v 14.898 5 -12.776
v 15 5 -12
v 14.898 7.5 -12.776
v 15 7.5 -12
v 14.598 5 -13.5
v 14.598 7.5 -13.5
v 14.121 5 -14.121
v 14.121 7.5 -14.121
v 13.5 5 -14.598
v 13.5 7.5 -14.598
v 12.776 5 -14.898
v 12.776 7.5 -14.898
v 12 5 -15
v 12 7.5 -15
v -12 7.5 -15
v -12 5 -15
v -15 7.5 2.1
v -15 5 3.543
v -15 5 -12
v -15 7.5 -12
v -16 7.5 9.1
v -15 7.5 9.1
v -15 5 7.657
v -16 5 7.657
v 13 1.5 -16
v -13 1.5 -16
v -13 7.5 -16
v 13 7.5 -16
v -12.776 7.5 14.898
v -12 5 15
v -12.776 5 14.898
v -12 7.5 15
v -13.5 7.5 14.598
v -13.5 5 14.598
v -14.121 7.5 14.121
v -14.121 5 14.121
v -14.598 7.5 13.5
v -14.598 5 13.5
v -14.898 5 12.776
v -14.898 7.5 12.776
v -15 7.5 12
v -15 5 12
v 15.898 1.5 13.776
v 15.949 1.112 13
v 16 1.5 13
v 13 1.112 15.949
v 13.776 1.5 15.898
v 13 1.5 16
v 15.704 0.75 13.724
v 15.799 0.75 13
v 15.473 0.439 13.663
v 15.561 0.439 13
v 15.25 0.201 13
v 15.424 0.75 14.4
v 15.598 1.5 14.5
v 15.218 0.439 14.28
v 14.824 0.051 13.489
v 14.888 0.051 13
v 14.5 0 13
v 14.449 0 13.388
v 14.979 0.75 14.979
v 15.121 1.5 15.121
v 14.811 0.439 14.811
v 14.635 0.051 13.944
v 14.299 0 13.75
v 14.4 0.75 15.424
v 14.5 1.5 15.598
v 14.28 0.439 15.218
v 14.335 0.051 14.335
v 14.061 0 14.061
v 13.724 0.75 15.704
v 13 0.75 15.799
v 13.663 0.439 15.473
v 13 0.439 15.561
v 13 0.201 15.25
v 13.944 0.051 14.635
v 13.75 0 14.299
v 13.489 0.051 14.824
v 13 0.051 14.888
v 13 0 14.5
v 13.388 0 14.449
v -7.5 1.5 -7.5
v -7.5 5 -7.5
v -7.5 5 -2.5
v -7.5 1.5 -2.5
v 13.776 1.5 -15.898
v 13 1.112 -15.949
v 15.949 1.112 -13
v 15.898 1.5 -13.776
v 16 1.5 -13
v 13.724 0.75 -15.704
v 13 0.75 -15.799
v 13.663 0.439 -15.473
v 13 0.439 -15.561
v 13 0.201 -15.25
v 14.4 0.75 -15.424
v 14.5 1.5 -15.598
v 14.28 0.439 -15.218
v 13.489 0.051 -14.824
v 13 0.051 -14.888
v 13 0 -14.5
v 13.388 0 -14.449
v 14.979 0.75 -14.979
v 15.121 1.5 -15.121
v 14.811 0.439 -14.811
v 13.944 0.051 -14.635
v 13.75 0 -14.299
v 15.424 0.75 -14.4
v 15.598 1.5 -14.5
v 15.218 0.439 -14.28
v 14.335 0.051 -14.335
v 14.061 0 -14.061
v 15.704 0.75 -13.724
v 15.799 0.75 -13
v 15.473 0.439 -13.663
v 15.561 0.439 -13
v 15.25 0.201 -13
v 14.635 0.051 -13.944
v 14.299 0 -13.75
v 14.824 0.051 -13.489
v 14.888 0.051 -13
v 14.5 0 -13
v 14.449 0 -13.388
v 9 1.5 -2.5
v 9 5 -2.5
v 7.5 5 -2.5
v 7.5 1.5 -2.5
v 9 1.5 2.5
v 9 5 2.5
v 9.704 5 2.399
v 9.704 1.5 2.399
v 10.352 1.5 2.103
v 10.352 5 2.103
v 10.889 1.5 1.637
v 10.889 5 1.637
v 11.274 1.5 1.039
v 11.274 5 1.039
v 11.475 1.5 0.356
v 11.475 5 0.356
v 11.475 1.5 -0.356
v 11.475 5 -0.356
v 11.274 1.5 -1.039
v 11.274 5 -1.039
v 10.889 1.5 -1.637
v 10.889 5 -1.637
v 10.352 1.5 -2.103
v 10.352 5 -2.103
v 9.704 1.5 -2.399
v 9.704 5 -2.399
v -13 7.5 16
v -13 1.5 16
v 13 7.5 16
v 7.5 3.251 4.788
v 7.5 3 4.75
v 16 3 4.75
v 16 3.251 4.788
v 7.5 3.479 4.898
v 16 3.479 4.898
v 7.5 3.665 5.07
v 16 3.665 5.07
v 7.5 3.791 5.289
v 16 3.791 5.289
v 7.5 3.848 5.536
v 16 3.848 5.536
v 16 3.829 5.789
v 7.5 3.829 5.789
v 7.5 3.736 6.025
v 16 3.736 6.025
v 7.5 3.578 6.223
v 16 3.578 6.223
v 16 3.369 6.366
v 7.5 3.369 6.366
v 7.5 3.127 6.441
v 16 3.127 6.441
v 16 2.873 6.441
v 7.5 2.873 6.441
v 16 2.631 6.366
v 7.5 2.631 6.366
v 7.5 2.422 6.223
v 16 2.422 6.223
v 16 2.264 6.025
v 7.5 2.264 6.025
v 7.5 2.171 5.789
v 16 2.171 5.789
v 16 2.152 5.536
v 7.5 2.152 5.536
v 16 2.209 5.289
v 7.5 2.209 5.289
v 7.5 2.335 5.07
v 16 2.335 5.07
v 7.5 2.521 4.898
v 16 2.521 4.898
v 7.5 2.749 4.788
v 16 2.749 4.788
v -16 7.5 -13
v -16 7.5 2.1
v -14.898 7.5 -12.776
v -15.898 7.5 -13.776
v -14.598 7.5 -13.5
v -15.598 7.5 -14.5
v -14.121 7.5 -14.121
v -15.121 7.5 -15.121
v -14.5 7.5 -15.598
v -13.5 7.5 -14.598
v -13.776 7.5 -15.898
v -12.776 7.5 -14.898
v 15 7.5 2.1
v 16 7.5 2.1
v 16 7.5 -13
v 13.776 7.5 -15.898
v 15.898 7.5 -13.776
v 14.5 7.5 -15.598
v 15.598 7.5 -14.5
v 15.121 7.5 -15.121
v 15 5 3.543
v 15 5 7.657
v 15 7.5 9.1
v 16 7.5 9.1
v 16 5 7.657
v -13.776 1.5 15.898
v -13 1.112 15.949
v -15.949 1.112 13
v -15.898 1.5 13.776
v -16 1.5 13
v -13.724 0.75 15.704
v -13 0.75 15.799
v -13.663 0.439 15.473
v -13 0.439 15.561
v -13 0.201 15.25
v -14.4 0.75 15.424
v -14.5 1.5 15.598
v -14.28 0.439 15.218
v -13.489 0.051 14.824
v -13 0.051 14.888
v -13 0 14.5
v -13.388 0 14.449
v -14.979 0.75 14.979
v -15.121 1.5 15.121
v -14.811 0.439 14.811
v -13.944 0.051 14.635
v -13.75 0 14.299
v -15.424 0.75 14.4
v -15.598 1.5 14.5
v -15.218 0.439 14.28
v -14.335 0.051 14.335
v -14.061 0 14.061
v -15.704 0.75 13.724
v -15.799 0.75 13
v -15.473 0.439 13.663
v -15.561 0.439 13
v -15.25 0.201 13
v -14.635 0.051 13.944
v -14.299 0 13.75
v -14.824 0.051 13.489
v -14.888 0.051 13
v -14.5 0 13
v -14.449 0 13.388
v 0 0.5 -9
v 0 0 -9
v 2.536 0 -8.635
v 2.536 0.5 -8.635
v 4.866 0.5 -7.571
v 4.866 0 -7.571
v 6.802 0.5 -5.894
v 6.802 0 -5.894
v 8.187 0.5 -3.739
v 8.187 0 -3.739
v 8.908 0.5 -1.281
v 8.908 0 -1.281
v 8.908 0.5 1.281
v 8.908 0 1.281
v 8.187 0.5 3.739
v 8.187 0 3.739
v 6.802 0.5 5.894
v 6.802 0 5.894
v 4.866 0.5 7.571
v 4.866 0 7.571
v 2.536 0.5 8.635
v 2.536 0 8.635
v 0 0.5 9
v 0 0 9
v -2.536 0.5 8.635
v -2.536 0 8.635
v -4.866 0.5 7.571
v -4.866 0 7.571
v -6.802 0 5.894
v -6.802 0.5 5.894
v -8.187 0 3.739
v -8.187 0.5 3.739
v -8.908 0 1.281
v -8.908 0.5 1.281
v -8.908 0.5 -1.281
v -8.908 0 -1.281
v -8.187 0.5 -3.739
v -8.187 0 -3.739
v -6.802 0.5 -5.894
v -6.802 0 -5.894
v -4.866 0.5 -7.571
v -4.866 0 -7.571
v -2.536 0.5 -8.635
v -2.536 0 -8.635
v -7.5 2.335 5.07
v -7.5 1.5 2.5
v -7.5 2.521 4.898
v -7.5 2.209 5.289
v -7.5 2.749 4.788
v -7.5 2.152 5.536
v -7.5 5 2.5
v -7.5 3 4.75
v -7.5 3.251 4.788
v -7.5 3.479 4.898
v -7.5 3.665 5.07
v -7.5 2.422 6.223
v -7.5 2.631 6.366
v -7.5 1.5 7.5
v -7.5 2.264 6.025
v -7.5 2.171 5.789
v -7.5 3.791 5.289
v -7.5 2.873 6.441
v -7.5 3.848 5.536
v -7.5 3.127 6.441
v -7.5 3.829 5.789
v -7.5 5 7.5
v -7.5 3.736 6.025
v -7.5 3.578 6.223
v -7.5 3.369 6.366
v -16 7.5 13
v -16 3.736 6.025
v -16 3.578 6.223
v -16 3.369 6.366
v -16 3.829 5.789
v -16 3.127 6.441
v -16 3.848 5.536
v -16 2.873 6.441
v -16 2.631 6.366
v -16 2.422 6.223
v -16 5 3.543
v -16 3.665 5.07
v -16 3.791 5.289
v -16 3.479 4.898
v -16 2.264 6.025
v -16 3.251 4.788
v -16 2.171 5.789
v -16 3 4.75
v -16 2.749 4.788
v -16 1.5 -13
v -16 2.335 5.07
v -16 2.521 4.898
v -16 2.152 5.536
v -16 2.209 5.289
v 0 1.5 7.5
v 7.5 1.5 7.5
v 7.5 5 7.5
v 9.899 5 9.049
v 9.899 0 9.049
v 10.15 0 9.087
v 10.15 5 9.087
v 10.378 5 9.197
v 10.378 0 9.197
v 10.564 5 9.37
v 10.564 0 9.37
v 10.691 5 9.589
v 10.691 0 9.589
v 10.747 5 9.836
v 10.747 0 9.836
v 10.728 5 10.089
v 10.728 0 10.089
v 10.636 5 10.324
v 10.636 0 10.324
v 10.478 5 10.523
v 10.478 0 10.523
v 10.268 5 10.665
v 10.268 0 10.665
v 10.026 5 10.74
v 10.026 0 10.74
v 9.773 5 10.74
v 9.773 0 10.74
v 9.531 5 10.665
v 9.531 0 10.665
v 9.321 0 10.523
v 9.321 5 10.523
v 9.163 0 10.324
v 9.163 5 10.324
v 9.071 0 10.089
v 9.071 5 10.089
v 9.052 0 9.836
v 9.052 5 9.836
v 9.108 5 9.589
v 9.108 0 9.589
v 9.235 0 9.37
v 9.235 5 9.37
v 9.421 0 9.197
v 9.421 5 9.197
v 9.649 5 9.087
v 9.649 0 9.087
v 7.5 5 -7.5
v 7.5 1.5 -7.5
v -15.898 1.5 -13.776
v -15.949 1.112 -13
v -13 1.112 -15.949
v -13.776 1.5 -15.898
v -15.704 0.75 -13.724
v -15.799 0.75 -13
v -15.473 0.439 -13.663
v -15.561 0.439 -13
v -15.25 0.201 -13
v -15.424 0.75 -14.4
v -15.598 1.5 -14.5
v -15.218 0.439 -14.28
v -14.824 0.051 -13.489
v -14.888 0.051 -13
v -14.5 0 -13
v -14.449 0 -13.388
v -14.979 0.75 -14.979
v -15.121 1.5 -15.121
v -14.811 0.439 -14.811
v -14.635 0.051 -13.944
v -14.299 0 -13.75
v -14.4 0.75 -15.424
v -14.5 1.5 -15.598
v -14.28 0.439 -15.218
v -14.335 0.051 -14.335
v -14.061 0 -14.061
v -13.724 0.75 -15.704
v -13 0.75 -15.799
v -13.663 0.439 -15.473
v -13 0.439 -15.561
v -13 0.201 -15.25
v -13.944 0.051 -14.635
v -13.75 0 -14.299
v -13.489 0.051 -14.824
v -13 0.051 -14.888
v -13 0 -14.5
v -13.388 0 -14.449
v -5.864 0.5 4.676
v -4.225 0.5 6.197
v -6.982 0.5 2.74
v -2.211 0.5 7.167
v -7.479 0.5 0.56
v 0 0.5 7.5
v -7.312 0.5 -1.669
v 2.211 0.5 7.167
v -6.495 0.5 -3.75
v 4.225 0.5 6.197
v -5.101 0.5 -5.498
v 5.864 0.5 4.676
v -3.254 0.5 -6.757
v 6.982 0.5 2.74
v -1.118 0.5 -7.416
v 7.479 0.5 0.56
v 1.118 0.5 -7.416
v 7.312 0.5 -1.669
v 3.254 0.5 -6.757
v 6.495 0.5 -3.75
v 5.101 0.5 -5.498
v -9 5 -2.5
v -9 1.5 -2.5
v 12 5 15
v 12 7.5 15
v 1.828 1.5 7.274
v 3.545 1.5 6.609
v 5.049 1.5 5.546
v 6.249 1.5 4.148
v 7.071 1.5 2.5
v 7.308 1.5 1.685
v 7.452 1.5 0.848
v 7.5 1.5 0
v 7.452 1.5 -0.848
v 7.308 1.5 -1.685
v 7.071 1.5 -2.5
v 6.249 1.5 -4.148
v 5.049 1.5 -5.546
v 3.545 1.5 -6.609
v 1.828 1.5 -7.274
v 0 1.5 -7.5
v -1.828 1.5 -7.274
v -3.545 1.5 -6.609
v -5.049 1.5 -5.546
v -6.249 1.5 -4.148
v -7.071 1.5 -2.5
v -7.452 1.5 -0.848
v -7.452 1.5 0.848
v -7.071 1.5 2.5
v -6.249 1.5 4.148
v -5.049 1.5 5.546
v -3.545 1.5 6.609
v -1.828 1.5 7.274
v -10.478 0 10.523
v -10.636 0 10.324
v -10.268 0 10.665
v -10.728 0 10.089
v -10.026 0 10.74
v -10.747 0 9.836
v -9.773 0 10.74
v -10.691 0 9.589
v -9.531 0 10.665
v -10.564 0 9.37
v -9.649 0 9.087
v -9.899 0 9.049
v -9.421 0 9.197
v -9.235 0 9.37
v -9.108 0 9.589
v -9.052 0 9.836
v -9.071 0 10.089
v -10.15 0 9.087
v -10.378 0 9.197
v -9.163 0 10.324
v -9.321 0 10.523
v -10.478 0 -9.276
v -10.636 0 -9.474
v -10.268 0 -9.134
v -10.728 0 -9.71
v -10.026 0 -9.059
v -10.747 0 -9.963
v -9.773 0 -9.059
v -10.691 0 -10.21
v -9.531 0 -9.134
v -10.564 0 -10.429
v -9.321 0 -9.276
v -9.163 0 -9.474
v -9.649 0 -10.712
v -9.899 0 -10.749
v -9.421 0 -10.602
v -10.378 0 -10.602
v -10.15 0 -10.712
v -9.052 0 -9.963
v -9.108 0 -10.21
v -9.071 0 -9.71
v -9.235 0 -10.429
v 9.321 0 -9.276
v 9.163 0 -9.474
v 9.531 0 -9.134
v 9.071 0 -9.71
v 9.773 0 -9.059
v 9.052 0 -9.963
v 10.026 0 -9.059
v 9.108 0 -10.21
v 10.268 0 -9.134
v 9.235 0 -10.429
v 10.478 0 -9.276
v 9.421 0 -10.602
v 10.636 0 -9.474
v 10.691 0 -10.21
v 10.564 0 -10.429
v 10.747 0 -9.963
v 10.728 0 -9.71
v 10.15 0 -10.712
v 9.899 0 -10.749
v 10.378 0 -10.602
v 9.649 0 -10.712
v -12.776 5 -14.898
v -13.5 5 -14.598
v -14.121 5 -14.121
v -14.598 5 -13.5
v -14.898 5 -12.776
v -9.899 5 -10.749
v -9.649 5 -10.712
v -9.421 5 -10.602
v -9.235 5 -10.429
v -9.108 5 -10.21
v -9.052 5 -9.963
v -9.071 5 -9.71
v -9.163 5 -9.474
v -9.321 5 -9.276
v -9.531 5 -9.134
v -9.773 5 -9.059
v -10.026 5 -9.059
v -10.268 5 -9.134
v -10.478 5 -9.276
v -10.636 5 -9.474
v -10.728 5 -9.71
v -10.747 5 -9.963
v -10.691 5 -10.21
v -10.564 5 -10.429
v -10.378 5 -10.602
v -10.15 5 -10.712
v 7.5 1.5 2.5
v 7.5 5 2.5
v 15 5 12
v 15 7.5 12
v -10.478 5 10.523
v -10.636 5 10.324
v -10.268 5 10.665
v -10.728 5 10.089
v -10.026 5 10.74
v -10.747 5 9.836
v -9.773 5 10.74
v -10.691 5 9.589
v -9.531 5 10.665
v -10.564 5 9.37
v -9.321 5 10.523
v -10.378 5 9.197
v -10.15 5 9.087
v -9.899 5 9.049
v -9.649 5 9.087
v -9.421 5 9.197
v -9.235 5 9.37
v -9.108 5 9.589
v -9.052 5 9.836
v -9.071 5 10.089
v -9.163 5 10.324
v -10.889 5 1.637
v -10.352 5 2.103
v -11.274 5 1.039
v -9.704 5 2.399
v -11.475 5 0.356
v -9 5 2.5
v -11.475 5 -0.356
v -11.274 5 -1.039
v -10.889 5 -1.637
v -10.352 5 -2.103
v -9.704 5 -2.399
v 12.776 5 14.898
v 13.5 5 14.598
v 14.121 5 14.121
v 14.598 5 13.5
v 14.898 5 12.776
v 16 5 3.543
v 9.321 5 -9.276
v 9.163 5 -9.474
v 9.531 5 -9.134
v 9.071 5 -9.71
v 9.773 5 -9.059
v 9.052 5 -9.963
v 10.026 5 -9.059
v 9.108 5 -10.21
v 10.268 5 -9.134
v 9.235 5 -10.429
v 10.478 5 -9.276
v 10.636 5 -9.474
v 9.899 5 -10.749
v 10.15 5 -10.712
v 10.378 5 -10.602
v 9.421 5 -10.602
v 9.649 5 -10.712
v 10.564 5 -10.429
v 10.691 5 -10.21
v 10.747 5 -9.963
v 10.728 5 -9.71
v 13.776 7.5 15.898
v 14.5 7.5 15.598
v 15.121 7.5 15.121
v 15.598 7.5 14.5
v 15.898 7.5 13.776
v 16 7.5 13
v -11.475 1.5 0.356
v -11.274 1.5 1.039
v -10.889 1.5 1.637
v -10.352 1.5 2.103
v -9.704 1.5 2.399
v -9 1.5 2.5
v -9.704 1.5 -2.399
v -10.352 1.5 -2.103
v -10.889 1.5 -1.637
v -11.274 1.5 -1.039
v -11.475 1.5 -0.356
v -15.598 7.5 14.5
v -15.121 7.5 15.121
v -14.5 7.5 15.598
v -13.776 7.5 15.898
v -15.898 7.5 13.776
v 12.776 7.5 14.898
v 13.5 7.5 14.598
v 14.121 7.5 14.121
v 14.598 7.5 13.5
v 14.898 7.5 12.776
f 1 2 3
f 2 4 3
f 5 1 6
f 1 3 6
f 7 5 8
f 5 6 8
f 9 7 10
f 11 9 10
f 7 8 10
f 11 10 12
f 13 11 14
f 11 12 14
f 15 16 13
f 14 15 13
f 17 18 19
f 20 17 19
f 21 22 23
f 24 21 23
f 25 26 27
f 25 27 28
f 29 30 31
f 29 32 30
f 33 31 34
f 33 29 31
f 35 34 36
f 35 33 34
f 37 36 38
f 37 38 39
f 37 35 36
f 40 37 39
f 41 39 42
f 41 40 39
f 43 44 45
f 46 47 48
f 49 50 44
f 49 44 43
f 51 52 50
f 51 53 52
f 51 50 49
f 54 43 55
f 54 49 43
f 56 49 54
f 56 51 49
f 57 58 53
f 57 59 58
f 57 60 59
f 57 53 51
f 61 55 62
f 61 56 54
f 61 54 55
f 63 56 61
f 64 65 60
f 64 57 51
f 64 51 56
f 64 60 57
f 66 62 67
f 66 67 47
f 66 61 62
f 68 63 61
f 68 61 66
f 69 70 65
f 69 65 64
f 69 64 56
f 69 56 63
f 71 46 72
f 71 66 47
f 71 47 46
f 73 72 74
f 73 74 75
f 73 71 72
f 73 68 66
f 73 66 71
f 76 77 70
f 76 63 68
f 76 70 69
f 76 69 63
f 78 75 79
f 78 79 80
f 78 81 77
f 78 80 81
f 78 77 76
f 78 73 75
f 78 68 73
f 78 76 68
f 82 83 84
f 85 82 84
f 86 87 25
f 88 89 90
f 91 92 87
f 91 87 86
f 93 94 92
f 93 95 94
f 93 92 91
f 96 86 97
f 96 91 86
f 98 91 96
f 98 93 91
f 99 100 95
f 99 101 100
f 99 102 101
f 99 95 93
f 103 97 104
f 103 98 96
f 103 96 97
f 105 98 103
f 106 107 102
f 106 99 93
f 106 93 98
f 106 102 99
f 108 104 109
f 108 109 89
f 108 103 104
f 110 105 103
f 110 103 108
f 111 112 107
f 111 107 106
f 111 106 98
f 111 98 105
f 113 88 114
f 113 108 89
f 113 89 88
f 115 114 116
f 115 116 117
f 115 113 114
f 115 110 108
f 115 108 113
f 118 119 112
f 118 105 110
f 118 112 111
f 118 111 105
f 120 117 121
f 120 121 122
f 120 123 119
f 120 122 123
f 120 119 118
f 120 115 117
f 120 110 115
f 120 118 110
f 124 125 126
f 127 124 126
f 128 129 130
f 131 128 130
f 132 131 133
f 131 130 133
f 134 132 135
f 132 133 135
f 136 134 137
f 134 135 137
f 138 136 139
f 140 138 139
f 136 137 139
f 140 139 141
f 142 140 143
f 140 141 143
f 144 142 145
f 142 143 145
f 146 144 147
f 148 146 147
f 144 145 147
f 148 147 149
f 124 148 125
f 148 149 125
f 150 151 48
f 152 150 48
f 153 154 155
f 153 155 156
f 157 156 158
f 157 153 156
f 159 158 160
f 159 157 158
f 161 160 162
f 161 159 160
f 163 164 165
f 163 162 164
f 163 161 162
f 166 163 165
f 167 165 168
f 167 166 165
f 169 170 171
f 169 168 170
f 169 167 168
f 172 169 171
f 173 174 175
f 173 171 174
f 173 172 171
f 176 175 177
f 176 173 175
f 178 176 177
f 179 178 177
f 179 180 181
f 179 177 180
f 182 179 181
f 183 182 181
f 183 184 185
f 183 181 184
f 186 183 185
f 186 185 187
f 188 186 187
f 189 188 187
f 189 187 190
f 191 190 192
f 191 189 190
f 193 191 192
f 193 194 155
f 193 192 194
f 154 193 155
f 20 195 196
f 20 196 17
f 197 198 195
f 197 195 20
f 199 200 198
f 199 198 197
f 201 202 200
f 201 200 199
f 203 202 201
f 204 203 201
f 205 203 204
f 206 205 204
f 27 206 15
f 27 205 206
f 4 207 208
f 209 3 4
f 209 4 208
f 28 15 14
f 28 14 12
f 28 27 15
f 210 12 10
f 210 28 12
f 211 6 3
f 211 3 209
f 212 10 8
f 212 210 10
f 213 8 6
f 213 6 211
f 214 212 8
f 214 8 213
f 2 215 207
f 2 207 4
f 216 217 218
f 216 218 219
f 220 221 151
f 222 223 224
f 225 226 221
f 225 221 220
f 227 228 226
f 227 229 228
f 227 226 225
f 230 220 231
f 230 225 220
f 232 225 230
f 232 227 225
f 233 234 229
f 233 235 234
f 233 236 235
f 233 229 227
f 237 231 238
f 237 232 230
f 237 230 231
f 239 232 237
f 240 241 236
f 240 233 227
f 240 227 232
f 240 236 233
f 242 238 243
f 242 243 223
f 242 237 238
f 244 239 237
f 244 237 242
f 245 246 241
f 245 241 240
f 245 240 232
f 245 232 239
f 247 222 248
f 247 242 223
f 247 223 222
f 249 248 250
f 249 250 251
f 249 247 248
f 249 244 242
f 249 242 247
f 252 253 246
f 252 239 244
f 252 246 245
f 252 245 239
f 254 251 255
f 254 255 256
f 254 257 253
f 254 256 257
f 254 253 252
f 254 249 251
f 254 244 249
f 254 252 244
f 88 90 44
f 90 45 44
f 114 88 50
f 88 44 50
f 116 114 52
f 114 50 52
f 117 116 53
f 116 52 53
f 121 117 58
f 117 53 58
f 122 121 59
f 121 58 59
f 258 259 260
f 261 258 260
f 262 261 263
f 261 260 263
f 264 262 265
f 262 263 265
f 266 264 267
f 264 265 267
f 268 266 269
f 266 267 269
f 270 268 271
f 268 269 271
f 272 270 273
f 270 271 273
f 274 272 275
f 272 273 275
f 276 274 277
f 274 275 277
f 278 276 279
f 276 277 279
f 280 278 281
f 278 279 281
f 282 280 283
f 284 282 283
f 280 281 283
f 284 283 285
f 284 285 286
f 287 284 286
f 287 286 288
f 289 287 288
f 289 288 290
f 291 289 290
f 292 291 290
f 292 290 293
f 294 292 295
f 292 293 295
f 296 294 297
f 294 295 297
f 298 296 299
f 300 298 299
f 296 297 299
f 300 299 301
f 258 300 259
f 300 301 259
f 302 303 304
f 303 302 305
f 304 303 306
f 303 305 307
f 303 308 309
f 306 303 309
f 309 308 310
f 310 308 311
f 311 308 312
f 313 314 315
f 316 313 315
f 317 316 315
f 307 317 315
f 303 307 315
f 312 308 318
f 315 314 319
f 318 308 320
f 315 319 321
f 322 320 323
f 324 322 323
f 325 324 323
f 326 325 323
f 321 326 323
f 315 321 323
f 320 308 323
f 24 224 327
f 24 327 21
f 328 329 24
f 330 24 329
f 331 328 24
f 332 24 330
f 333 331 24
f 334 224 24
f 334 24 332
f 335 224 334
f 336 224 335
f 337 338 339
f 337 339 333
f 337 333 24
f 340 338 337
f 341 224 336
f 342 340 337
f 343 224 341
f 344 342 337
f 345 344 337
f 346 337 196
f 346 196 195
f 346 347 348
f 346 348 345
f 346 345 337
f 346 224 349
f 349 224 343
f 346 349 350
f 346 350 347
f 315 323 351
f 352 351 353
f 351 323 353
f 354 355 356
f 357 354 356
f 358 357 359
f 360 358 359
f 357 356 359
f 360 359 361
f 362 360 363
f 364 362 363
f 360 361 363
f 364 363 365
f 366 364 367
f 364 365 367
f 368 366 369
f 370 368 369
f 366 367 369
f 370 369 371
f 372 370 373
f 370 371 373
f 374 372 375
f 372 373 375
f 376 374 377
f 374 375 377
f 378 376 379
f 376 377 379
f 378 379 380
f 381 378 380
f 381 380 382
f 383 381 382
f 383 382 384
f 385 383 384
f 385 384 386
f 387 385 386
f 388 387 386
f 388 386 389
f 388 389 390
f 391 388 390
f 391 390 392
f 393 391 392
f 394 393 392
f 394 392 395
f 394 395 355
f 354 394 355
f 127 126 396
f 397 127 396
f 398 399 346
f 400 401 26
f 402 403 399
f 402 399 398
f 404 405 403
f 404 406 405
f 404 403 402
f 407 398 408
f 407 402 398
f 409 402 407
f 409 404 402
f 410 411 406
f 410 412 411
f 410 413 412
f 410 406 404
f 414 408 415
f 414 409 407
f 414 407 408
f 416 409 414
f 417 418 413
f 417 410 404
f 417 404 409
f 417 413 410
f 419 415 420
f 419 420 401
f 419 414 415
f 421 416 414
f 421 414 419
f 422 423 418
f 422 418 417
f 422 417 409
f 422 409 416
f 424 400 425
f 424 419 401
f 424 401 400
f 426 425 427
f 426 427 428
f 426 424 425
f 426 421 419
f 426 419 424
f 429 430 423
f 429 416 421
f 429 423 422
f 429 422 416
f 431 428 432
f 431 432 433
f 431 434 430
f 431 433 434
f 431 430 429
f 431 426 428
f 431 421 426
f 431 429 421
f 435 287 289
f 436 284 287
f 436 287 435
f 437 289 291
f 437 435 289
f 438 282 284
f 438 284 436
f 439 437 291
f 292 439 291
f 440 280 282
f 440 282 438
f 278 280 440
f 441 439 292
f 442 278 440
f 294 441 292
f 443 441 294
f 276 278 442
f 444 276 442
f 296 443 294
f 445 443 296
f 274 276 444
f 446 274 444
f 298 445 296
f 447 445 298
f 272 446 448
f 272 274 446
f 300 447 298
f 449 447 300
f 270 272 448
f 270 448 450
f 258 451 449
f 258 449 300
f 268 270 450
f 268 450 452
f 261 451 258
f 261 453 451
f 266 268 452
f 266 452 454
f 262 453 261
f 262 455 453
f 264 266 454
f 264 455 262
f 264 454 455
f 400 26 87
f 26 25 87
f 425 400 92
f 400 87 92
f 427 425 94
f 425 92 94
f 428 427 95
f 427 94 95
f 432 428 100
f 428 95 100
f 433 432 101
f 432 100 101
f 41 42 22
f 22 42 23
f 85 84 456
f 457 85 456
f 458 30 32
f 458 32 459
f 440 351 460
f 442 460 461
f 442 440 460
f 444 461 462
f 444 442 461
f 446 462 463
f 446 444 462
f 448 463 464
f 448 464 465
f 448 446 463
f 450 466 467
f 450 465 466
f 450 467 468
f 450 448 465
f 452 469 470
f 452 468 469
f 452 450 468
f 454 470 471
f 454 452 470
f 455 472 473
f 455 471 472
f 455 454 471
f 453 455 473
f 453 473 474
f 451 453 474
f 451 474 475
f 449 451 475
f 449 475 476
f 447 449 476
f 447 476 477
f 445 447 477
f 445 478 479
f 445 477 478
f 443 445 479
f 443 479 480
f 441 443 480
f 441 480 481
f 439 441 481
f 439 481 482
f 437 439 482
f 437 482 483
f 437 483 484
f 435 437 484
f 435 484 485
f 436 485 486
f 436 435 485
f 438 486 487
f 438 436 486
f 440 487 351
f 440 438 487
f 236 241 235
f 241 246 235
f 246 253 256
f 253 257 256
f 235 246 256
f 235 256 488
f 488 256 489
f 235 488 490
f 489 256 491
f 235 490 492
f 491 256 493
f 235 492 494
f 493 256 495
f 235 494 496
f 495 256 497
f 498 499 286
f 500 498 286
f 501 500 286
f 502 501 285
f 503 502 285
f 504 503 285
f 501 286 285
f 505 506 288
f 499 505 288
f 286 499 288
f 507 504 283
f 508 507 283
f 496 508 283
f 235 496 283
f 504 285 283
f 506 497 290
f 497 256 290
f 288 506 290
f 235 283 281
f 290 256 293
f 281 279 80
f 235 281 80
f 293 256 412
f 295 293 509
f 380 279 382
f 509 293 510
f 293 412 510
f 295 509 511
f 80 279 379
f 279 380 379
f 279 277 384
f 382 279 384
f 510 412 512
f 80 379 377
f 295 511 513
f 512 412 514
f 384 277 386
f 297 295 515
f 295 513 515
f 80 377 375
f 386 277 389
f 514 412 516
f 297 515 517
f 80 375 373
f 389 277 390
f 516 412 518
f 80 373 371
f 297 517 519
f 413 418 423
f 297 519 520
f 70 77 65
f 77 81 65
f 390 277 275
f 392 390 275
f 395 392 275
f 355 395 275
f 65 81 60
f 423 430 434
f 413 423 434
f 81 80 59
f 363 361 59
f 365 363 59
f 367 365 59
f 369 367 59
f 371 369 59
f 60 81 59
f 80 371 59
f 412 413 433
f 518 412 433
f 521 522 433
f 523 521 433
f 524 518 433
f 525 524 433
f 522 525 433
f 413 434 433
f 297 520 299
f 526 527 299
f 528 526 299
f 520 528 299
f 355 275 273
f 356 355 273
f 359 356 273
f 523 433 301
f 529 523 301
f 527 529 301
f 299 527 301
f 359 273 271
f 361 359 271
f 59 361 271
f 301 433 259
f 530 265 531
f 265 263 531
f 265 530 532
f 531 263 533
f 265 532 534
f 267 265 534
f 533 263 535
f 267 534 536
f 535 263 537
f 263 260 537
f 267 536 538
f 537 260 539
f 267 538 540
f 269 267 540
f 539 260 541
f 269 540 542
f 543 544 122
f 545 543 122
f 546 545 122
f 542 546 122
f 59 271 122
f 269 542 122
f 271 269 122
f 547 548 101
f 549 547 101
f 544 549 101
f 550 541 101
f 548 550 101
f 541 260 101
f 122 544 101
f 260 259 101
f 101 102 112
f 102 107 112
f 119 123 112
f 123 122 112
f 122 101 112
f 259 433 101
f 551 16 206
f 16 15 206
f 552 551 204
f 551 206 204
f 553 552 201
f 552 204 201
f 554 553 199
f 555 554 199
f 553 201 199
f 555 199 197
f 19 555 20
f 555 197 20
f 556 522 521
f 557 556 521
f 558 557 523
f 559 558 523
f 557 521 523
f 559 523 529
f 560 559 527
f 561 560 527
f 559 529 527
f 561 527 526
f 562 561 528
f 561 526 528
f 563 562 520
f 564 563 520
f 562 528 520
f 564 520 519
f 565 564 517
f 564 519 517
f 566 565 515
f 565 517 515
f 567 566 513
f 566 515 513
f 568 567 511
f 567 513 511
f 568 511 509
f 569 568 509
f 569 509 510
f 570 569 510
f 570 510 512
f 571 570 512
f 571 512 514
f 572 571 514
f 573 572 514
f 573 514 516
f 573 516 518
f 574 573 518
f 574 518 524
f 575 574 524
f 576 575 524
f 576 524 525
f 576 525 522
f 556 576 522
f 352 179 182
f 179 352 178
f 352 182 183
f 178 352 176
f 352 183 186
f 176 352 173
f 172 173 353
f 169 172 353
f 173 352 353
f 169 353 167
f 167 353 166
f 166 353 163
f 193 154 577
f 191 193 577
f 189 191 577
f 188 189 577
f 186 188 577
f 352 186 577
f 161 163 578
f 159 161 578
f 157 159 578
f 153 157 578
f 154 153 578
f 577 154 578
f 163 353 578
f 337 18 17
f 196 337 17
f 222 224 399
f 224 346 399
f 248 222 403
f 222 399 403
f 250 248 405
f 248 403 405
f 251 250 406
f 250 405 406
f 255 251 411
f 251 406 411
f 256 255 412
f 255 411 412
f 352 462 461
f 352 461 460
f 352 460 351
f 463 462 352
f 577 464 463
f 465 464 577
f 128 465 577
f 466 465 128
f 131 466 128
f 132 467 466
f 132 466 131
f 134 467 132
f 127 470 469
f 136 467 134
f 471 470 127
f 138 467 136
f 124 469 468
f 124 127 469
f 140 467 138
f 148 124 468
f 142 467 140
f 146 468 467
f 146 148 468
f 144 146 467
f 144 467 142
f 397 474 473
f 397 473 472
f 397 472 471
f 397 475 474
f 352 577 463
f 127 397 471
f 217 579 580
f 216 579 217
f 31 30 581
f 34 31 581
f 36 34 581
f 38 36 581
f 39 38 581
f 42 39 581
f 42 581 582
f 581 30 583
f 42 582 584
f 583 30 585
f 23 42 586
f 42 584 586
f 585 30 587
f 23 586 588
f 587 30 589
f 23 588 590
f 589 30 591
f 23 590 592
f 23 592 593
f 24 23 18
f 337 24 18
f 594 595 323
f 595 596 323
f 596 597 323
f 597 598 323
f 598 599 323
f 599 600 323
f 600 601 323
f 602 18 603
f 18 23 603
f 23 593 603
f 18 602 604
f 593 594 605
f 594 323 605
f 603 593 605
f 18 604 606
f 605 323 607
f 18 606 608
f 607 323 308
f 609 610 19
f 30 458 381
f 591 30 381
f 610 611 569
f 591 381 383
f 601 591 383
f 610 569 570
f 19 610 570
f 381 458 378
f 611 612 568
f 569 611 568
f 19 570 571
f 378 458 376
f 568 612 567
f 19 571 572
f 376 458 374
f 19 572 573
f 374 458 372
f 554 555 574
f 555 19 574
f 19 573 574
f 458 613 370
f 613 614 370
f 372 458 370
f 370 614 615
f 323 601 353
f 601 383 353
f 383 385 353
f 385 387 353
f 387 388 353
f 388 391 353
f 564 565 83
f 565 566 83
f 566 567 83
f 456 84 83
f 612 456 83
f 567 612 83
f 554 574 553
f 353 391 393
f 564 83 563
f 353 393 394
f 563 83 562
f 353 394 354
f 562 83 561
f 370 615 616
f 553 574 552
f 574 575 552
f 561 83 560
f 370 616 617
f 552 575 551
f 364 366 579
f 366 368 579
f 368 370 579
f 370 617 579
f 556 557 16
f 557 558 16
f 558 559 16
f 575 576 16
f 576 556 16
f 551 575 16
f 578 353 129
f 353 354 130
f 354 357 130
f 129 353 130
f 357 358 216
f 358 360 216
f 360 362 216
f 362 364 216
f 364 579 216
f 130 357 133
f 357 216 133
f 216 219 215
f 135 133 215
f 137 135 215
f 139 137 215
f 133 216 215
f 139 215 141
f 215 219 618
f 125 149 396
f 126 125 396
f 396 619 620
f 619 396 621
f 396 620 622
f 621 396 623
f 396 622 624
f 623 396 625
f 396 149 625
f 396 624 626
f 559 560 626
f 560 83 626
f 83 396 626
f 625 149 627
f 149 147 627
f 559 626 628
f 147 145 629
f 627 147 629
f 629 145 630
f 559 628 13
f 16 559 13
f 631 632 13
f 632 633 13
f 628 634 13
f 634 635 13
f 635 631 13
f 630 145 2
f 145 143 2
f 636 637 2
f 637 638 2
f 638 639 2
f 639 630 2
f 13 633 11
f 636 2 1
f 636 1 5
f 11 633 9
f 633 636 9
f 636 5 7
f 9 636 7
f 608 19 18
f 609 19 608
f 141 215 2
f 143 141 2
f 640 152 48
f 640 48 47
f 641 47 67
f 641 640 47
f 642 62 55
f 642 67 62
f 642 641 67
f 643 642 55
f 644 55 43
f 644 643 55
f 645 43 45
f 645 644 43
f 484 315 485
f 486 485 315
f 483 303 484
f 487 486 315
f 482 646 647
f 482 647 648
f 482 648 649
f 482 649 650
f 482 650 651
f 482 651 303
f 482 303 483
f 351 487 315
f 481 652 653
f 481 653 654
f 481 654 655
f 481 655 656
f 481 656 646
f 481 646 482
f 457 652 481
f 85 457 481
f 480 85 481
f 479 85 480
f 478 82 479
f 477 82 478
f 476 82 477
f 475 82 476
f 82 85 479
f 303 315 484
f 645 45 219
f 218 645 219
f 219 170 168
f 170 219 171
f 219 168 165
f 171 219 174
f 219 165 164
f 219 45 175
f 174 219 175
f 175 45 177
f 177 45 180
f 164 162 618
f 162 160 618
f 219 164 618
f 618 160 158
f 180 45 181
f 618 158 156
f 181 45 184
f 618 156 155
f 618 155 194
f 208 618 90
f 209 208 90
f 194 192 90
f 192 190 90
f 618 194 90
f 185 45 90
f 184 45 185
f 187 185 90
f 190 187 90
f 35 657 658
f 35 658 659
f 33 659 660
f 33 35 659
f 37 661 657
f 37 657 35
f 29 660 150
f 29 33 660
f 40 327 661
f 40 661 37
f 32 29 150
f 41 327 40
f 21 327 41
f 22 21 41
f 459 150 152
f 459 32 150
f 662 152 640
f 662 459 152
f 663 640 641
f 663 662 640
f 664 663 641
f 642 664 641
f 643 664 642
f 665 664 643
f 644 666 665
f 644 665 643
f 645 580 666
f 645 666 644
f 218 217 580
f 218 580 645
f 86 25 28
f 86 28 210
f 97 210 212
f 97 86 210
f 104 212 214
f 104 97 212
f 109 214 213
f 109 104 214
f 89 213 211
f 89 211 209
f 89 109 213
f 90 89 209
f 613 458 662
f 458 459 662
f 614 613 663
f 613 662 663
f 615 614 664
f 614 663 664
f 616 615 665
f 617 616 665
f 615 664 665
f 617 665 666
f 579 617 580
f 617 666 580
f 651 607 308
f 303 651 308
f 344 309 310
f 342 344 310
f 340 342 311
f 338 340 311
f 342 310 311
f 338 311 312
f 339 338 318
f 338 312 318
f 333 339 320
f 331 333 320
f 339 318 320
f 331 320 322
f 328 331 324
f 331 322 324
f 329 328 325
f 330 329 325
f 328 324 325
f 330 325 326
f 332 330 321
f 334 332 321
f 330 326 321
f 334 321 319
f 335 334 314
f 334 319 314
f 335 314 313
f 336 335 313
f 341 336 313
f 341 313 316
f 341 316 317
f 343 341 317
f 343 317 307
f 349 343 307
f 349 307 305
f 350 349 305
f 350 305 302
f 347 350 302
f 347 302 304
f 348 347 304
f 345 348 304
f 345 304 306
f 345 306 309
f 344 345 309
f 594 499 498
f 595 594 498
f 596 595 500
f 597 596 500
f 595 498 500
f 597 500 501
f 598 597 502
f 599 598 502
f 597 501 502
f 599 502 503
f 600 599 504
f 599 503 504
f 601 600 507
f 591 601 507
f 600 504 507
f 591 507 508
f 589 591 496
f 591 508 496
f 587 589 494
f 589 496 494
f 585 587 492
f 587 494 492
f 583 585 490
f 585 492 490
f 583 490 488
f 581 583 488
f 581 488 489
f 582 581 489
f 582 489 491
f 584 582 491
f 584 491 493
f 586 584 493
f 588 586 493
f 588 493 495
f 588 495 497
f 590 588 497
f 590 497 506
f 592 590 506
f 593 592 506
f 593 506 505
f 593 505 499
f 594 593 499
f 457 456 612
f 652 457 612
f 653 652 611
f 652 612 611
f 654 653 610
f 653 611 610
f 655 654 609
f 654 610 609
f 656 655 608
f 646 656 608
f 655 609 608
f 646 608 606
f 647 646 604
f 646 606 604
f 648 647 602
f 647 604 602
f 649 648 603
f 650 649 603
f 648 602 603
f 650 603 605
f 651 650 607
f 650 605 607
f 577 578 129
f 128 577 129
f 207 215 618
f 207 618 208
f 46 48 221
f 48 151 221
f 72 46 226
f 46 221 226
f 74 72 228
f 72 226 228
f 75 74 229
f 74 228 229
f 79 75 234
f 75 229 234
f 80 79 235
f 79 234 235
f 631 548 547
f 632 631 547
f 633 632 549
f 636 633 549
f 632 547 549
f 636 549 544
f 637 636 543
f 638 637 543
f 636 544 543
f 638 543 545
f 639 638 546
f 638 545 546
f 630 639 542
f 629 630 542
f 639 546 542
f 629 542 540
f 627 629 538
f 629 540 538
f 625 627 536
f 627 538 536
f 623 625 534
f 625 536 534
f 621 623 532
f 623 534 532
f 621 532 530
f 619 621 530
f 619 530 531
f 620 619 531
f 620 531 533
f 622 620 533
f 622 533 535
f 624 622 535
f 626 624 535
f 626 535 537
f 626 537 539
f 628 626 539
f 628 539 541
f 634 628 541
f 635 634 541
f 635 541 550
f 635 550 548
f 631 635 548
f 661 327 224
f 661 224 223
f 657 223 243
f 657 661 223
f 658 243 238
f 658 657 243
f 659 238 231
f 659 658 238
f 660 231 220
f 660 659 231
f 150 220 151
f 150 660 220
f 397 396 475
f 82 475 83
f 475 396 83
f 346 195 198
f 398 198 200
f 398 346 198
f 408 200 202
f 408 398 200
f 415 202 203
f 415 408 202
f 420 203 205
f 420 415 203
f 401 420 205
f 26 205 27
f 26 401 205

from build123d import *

# Parameters (mm, degrees)
SKETCH_1_W               = 32
SKETCH_1_H               = 32
SKETCH_1_R               = 7.5
EXTRUDE_1_DEPTH          = 5
CUT_EXTRUDE_1_DEPTH      = 3.5
SKETCH_3_W               = 32
SKETCH_3_H               = 32
SKETCH_3_W_2             = 30
SKETCH_3_H_2             = 30
EXTRUDE_2_DEPTH          = 2.5
SKETCH_4_R               = 0.85
CUT_EXTRUDE_2_DEPTH      = 8.5
SKETCH_5_R               = 9
CUT_EXTRUDE_3_DEPTH      = 0.5
FILLET_1_R               = 3
SKETCH_6_R               = 0.85
CUT_EXTRUDE_4_DEPTH      = 17
CUT_EXTRUDE_4_DEPTH_BACK = 17
FILLET_2_R               = 1.5


with BuildPart() as part:
    # 草图1 → 凸台-拉伸1 (new body)
    with BuildSketch(Plane(origin=(0, 0, 0), x_dir=(1, 0, 0), z_dir=(0, 1, 0))):
        Rectangle(SKETCH_1_W, SKETCH_1_H)
        with Locations(Location((0, 0, 0), (0, 0, 270))):  # turned: the seam where the file's is
            Circle(SKETCH_1_R, mode=Mode.SUBTRACT)
    extrude(amount=EXTRUDE_1_DEPTH)

    # 草图2 → 切除-拉伸1 (cut)
    with BuildSketch(Plane(origin=(0, 5, 0), x_dir=(1, 0, 0), z_dir=(0, 1, 0))):
        with BuildLine():
            Line((-1.6e-08, 7.5), (-7.5, 7.5))
            Line((-7.5, 7.5), (-7.5, 2.5))
            Line((-7.5, 2.5), (-7.071067812, 2.5))
            ThreePointArc((-7.071067812, 2.5), (-4.330127025, 6.123724352), (-1.6e-08, 7.5))
        make_face()
        with BuildLine():
            Line((7.5, 7.5), (-1.6e-08, 7.5))
            ThreePointArc((-1.6e-08, 7.5), (4.330127013, 6.123724361), (7.071067812, 2.5))
            Line((7.071067812, 2.5), (7.5, 2.5))
            Line((7.5, 2.5), (7.5, 7.5))
        make_face()
        with BuildLine():
            Line((-7.071067812, 2.5), (-7.5, 2.5))
            Line((-7.5, 2.5), (-9, 2.5))
            ThreePointArc((-9, 2.5), (-11.5, 0), (-9, -2.5))
            Line((-9, -2.5), (-7.5, -2.5))
            Line((-7.5, -2.5), (-7.071067812, -2.5))
            ThreePointArc((-7.071067812, -2.5), (-7.5, 0), (-7.071067812, 2.5))
        make_face()
        with BuildLine():
            Line((7.5, 2.5), (7.071067812, 2.5))
            ThreePointArc((7.071067812, 2.5), (7.391989197, 1.26826484), (7.5, 0))
            ThreePointArc((7.5, 0), (7.391989197, -1.26826484), (7.071067812, -2.5))
            Line((7.071067812, -2.5), (7.5, -2.5))
            Line((7.5, -2.5), (9, -2.5))
            ThreePointArc((9, -2.5), (11.5, 0), (9, 2.5))
            Line((9, 2.5), (7.5, 2.5))
        make_face()
        with BuildLine():
            Line((7.5, -2.5), (7.071067812, -2.5))
            ThreePointArc((7.071067812, -2.5), (4.330127019, -6.123724357), (0, -7.5))
            Line((0, -7.5), (7.5, -7.5))
            Line((7.5, -7.5), (7.5, -2.5))
        make_face()
        with BuildLine():
            ThreePointArc((0, -7.5), (-4.330127019, -6.123724357), (-7.071067812, -2.5))
            Line((-7.071067812, -2.5), (-7.5, -2.5))
            Line((-7.5, -2.5), (-7.5, -7.5))
            Line((-7.5, -7.5), (0, -7.5))
        make_face()
    extrude(amount=-CUT_EXTRUDE_1_DEPTH, mode=Mode.SUBTRACT)

    # 草图3 → 凸台-拉伸2 (add)
    with BuildSketch(Plane(origin=(0, 5, 0), x_dir=(1, 0, 0), z_dir=(0, 1, 0))):
        Rectangle(SKETCH_3_W, SKETCH_3_H)
        Rectangle(SKETCH_3_W_2, SKETCH_3_H_2, mode=Mode.SUBTRACT)
    extrude(amount=EXTRUDE_2_DEPTH)

    # 草图4 → 切除-拉伸2 (cut, through all)
    with BuildSketch(Plane.XZ):
        with Locations(Location((-9.899494937, 9.899494937, 0), (0, 0, 270))):  # turned: the seam where the file's is
            Circle(SKETCH_4_R)
        with Locations(Location((9.899494937, 9.899494937, 0), (0, 0, 270))):  # turned: the seam where the file's is
            Circle(SKETCH_4_R)
        with Locations(Location((9.899494937, -9.899494937, 0), (0, 0, 270))):  # turned: the seam where the file's is
            Circle(SKETCH_4_R)
        with Locations(Location((-9.899494937, -9.899494937, 0), (0, 0, 270))):  # turned: the seam where the file's is
            Circle(SKETCH_4_R)
    extrude(amount=-CUT_EXTRUDE_2_DEPTH, mode=Mode.SUBTRACT)

    # 草图5 → 切除-拉伸3 (cut)
    with BuildSketch(Plane.XZ):
        with Locations(Location((0, 0, 0), (0, 0, 270))):  # turned: the seam where the file's is
            Circle(SKETCH_5_R)
    extrude(amount=-CUT_EXTRUDE_3_DEPTH, mode=Mode.SUBTRACT)

    # 圆角1
    fillet_1_edges = [part.edges().sort_by_distance(p)[0] for p in [
        (15, 6.25, -15),
        (-15, 6.25, -15),
        (-15, 6.25, 15),
        (15, 6.25, 15),
        (-16, 3.75, -16),
        (16, 3.75, -16),
        (16, 3.75, 16),
        (-16, 3.75, 16),
    ]]
    fillet(fillet_1_edges, radius=FILLET_1_R)

    # 草图6 → 切除-拉伸4 (cut, two sides)
    with BuildSketch(Plane(origin=(0, 0, 0), x_dir=(0, 0, -1), z_dir=(1, 0, 0))) as cut_extrude_4_sk:
        with Locations((-5.6, 3)):
            Circle(SKETCH_6_R)
        Polygon((-7.656624327, 5), (-3.543375673, 5), (-2.1, 7.5), (-9.1, 7.5), align=None)
    extrude(amount=CUT_EXTRUDE_4_DEPTH, mode=Mode.SUBTRACT)
    extrude(cut_extrude_4_sk.sketch, amount=-CUT_EXTRUDE_4_DEPTH_BACK, mode=Mode.SUBTRACT)

    # 圆角2
    fillet_2_edges = [part.edges().sort_by_distance(p)[0] for p in [
        (-16, 0, 0),
        (0, 0, -16),
        (16, 0, 0),
        (0, 0, 16),
        (-15.121320344, 0, 15.121320344),
        (15.121320344, 0, 15.121320344),
        (15.121320344, 0, -15.121320344),
        (-15.121320344, 0, -15.121320344),
    ]]
    fillet(fillet_2_edges, radius=FILLET_2_R)


solid = part.part
